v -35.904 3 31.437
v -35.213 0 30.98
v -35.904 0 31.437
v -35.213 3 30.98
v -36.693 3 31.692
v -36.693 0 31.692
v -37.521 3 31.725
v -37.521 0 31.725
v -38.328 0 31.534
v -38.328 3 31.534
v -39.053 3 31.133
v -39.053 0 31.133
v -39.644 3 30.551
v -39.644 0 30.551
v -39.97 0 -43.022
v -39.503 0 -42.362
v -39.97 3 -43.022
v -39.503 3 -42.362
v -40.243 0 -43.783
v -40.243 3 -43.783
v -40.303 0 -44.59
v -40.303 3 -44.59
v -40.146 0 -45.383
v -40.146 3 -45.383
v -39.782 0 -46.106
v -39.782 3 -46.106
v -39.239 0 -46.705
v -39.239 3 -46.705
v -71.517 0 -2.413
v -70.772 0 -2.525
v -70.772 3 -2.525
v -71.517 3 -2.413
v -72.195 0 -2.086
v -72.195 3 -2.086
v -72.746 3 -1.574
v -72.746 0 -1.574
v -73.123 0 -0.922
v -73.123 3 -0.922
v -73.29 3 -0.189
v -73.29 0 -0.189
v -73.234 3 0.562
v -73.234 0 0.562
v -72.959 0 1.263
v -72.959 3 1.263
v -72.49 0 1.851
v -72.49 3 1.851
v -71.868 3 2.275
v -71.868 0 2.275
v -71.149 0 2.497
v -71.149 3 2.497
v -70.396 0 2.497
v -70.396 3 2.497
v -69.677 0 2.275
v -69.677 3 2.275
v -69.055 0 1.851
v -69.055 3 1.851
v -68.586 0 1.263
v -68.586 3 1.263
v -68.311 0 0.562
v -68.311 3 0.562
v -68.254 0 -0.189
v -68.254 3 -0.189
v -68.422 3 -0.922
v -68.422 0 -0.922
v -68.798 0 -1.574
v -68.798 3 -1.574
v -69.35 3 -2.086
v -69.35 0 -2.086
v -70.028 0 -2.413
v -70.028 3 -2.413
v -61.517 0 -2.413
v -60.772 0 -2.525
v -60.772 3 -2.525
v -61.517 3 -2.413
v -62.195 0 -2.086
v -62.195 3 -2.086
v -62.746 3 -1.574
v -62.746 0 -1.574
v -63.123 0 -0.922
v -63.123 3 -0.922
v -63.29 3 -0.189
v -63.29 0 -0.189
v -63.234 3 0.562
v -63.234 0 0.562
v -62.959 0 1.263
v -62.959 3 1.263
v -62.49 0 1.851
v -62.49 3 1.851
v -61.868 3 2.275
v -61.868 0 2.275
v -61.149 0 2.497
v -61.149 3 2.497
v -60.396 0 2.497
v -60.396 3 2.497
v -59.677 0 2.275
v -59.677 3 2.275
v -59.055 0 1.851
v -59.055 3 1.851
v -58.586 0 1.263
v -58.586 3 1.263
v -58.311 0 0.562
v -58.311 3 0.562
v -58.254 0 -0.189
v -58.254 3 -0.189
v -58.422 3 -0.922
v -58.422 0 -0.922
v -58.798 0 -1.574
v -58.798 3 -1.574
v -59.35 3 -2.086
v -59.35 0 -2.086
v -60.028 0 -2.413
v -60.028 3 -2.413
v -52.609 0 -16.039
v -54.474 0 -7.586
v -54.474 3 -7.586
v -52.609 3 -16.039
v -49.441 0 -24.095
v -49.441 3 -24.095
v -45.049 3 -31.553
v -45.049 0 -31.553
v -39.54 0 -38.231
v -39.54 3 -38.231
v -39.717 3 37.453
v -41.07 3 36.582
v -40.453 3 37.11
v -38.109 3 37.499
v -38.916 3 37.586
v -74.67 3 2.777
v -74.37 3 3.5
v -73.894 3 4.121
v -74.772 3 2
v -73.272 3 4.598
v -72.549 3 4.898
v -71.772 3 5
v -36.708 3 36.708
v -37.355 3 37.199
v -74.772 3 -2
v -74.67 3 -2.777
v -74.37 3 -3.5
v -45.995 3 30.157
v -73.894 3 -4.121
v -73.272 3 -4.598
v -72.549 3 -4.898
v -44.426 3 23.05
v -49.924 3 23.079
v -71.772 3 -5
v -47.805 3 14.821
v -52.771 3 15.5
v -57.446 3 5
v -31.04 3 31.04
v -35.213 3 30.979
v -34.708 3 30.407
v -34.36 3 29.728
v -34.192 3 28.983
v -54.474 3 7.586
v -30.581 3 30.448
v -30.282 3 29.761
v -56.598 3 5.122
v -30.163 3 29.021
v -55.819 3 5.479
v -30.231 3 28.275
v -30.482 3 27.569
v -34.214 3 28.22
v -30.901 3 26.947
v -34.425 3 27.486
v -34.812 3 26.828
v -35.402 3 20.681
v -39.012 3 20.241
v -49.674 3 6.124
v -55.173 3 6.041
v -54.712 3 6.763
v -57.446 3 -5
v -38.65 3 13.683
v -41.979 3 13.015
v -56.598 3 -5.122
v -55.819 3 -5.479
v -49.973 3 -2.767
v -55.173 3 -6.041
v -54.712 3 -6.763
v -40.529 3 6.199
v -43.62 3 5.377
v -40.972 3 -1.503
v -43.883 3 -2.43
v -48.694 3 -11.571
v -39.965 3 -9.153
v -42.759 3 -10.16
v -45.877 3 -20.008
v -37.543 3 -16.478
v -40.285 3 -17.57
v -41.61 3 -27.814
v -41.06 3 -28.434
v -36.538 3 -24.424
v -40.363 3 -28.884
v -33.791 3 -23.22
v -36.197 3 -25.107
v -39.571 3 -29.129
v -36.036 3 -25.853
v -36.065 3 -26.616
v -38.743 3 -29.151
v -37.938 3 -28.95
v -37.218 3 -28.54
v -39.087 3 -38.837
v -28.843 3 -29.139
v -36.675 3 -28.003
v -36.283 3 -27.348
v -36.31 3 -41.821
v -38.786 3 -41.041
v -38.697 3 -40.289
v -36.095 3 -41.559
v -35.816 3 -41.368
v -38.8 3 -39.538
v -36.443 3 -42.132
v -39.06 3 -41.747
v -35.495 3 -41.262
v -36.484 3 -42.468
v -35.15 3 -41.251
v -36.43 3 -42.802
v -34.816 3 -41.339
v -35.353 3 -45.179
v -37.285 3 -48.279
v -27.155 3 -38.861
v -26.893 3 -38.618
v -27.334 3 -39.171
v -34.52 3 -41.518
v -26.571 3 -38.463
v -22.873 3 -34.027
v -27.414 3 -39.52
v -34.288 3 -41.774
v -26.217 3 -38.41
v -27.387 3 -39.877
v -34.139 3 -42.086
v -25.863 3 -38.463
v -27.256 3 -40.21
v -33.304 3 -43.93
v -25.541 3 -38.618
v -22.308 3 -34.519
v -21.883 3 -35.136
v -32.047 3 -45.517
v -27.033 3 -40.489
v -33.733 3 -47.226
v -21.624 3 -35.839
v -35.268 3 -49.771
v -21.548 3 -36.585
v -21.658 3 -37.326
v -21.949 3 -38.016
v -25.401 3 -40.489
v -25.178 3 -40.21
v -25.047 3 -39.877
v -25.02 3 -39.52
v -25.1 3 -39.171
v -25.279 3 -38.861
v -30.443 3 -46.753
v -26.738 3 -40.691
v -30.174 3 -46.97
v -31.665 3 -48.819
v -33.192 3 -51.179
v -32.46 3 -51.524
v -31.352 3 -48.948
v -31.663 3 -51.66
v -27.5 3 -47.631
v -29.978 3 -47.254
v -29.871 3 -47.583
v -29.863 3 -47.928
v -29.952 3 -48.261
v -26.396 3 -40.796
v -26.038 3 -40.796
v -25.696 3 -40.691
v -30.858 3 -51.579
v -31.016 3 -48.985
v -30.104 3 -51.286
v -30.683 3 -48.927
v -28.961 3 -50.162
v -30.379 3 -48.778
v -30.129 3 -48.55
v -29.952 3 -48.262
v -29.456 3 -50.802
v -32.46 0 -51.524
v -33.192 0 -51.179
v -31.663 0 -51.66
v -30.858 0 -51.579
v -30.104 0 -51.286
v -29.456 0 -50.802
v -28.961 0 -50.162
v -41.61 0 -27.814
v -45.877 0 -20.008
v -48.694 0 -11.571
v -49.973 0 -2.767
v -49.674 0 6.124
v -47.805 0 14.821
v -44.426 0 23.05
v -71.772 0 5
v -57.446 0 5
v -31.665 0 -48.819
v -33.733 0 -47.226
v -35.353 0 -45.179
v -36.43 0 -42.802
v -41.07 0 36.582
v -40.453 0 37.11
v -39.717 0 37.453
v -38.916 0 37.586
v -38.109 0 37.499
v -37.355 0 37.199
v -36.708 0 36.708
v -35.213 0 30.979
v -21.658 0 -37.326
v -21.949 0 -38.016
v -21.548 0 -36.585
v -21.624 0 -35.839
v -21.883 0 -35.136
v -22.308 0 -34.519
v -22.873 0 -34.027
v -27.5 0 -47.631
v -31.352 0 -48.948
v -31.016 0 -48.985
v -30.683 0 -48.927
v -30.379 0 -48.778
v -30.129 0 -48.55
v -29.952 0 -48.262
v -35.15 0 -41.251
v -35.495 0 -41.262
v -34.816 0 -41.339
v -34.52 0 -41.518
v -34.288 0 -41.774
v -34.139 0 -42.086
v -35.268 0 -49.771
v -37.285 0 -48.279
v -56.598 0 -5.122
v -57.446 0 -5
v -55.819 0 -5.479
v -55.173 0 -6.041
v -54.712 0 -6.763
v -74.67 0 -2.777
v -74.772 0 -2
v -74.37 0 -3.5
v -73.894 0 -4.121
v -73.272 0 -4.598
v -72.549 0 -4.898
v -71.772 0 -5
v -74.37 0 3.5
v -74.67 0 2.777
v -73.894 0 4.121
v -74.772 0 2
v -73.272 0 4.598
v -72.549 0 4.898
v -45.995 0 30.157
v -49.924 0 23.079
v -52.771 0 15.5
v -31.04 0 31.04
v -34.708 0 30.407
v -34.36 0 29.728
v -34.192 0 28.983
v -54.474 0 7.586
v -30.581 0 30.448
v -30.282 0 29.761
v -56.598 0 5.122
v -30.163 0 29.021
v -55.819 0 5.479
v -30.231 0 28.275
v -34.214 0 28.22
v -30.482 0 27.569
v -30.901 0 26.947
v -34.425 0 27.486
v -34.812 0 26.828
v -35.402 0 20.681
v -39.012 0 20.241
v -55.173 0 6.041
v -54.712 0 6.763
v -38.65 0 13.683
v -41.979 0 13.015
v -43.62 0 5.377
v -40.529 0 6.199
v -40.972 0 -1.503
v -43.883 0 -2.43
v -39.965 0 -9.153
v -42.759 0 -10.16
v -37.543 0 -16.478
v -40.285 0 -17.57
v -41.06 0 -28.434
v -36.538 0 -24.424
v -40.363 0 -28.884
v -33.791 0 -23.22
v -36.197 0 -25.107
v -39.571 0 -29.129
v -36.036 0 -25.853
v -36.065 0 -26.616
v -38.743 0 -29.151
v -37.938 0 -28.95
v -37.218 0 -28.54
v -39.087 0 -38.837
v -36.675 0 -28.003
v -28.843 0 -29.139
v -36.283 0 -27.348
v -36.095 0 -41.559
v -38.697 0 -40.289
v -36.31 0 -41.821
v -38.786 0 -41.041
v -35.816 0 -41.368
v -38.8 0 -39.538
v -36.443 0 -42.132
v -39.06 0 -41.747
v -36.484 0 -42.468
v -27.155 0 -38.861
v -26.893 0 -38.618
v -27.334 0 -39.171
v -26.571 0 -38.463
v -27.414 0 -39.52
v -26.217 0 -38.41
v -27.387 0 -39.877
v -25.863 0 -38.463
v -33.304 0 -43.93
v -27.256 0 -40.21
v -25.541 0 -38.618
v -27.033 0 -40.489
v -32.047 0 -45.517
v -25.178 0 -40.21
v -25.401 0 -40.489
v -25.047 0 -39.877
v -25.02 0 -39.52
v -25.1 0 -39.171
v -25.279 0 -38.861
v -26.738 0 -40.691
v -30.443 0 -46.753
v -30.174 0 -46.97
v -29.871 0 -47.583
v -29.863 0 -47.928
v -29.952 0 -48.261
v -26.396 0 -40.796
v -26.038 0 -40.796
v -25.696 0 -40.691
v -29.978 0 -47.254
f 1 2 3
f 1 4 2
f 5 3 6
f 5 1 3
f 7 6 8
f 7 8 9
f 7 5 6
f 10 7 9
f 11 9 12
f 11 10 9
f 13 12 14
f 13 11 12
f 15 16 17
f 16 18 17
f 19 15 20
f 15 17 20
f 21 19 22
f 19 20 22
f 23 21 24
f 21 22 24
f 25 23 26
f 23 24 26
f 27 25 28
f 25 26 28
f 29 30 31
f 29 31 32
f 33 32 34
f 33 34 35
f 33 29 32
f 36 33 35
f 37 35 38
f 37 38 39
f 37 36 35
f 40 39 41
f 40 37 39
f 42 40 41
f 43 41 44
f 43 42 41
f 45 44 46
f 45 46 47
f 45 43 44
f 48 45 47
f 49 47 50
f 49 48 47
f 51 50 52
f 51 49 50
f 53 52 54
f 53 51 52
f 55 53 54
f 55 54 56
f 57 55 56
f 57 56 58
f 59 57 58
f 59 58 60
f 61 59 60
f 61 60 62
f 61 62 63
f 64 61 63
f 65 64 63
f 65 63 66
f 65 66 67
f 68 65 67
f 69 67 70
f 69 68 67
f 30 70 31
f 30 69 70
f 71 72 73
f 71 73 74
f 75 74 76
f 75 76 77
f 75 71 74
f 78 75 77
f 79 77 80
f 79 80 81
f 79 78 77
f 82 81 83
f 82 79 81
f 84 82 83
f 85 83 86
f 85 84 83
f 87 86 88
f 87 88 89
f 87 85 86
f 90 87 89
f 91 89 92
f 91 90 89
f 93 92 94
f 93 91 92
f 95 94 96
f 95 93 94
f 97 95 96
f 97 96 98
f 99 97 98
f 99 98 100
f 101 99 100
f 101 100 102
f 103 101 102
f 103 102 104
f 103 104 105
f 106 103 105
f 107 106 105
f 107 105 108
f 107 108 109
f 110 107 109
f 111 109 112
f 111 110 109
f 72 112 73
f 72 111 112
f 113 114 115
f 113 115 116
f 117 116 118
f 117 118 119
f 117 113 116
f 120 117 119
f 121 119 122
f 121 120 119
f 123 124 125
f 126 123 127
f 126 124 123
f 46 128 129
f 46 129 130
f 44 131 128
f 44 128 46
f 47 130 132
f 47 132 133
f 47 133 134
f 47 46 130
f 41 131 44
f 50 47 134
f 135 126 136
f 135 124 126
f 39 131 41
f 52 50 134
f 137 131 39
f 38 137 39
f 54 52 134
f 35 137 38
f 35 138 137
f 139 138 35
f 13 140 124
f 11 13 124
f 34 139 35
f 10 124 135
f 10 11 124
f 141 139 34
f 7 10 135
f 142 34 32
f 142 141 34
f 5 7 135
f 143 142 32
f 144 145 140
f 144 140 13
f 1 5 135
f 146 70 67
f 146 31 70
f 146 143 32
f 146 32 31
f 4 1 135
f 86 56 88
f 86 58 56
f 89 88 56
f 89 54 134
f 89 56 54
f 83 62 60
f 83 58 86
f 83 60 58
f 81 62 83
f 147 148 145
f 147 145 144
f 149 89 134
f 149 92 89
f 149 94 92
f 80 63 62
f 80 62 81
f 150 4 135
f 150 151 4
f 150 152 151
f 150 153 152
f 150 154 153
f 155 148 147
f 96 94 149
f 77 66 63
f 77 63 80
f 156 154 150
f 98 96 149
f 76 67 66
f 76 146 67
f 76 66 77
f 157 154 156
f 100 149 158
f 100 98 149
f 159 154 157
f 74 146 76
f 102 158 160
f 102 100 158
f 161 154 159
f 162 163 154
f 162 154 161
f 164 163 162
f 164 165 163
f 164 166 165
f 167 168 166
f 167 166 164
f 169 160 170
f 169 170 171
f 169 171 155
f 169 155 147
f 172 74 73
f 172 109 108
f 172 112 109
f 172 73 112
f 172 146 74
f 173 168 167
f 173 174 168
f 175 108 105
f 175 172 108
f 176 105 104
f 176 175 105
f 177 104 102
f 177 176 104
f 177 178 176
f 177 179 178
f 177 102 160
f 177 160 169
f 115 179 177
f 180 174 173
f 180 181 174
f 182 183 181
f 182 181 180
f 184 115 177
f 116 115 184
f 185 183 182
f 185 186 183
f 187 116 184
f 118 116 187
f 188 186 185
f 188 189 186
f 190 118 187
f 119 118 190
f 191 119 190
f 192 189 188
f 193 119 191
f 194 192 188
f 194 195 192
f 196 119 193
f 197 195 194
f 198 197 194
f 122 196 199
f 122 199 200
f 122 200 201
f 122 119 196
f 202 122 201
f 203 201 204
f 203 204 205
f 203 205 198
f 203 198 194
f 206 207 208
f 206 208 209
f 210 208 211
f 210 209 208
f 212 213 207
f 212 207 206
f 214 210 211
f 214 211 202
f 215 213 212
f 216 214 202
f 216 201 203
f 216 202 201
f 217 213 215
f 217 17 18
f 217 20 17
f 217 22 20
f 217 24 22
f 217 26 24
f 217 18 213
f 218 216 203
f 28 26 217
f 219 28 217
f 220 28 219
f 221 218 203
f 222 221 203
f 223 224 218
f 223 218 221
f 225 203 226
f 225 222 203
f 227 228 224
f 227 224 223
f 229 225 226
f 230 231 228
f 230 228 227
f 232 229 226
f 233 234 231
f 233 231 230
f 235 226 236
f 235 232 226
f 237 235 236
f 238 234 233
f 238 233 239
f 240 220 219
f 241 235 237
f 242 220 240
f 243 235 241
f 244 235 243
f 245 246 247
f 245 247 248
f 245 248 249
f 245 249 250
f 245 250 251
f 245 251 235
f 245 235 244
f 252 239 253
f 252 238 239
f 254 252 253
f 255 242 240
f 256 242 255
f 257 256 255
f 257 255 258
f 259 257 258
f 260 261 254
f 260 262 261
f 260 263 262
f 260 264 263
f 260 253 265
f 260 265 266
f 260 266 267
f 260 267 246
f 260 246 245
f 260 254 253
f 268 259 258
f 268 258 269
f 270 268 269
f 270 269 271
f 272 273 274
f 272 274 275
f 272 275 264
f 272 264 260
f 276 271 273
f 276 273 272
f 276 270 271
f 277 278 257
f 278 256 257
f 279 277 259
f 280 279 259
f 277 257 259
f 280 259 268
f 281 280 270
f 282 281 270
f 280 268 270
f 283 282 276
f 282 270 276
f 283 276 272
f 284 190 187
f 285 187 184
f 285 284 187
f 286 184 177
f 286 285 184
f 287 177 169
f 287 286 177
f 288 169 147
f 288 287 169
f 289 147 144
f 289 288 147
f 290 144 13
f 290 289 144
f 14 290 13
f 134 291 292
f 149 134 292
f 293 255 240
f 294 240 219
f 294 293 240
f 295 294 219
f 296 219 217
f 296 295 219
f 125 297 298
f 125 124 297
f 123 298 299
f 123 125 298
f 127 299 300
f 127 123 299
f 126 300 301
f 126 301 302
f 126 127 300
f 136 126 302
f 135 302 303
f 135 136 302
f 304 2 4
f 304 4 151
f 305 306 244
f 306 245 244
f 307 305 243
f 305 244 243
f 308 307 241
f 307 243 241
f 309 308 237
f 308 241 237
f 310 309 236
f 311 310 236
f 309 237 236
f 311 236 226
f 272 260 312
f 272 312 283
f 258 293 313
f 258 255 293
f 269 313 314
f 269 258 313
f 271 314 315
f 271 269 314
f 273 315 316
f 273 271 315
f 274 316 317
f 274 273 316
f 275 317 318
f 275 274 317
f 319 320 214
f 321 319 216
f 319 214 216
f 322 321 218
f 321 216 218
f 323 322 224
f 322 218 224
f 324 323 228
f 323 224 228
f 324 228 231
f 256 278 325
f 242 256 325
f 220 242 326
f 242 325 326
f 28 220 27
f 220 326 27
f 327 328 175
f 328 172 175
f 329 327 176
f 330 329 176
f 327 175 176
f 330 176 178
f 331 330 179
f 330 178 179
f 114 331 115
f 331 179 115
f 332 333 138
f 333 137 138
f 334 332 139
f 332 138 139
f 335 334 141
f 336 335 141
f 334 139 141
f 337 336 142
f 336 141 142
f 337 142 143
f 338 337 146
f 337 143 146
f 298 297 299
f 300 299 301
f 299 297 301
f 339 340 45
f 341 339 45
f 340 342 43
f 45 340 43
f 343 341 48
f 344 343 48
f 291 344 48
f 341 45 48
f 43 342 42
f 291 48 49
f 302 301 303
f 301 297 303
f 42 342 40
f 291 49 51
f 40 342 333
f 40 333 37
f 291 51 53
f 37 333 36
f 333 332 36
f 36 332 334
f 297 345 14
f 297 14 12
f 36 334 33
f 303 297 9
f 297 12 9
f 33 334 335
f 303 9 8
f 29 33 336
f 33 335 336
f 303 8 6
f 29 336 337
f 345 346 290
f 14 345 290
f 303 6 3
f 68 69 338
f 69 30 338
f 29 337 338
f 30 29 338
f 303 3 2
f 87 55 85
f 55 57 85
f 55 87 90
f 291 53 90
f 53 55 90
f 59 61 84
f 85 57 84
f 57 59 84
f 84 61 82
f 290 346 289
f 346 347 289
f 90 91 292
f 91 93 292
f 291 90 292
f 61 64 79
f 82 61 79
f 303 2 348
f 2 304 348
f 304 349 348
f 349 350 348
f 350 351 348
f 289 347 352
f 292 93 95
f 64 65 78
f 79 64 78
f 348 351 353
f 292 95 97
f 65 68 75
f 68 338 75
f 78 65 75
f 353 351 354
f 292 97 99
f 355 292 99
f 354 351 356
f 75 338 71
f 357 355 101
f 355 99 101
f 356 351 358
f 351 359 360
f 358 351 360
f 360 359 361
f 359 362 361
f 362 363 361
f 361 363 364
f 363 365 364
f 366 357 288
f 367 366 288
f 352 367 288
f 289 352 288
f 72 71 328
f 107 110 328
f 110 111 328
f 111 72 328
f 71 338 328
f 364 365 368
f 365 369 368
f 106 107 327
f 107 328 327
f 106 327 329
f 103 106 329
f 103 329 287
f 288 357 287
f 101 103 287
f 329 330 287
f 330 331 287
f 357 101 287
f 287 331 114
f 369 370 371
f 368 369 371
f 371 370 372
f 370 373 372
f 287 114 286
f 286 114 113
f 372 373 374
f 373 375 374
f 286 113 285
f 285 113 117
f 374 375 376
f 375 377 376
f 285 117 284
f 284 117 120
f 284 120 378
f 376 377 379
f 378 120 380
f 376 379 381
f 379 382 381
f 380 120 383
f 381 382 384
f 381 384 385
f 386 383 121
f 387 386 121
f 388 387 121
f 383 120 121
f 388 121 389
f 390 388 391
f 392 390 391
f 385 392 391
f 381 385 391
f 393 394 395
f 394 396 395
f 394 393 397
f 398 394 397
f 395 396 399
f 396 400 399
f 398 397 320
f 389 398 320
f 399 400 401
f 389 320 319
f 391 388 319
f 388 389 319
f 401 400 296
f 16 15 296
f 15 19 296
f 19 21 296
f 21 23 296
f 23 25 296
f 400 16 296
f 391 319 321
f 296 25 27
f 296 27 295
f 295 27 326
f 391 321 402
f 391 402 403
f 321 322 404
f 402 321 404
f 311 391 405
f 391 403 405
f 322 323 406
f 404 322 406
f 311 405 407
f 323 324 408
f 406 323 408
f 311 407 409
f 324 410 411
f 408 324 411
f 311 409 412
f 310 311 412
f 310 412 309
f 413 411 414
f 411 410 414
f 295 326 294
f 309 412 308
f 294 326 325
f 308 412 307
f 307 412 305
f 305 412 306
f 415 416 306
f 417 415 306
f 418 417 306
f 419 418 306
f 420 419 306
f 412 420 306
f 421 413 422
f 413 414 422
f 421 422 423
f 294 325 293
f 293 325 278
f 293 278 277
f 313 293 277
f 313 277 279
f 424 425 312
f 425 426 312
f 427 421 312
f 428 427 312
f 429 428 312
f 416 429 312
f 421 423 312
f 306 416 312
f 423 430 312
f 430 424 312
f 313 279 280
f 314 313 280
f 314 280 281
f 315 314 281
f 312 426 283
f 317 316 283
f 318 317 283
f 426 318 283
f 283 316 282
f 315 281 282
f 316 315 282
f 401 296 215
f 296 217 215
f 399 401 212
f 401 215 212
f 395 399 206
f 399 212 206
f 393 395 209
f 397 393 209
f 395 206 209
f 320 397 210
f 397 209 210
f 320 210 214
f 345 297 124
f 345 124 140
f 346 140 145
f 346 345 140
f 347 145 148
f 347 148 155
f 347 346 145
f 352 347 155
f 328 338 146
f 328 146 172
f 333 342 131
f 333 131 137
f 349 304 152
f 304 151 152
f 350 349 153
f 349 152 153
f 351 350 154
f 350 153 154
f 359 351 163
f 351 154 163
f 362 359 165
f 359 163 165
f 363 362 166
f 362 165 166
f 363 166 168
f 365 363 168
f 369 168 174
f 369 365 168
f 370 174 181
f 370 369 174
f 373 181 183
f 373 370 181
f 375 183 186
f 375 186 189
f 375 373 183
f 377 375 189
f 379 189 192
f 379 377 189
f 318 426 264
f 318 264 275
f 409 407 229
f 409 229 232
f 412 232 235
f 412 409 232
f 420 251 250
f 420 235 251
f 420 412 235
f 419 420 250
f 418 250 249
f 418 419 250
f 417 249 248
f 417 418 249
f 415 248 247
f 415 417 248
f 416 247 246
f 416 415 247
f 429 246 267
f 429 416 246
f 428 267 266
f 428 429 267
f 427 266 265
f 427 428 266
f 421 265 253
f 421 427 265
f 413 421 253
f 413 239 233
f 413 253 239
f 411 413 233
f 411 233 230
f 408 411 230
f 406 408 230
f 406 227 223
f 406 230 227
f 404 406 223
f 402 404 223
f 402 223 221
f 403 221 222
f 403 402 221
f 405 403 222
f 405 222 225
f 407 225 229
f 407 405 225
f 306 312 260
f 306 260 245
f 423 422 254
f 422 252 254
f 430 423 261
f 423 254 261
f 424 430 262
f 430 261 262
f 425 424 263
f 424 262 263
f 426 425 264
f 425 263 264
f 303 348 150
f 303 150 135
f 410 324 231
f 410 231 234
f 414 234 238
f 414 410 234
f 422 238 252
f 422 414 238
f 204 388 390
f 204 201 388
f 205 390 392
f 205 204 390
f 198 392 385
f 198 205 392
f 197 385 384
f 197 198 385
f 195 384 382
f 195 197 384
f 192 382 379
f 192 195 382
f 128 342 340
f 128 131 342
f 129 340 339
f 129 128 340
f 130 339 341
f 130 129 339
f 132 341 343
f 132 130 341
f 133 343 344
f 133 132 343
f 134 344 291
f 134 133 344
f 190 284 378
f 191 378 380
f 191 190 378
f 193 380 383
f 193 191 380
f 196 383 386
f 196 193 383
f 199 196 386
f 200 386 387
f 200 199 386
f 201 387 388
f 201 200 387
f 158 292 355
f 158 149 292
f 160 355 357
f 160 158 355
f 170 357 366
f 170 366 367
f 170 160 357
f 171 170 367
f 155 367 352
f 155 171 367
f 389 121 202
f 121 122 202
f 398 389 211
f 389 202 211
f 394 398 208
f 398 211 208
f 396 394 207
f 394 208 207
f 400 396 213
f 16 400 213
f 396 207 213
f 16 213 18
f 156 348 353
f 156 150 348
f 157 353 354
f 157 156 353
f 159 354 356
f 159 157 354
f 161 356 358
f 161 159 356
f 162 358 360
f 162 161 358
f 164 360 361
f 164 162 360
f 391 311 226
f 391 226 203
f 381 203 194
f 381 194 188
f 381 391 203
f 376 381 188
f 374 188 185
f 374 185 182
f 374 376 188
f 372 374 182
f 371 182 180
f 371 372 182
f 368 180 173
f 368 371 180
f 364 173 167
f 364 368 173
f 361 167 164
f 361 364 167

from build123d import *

# Parameters (mm, degrees)
BOSS_EXTRUDE1_DEPTH          = 3
CUT_EXTRUDE_THIN1_DEPTH      = 73.819983521
CUT_EXTRUDE_THIN1_DEPTH_BACK = 3
FILLET1_R                    = 3.05
BOSS_EXTRUDE2_DEPTH          = 3
CUT_EXTRUDE1_DEPTH           = 77.32004979
CUT_EXTRUDE1_DEPTH_BACK      = 77.32004979
SKETCH4_R                    = 1.2
CUT_EXTRUDE_THIN2_DEPTH      = 77.32004979
CUT_EXTRUDE_THIN2_DEPTH_BACK = 3
FILLET2_R                    = 1.2
SKETCH6_W                    = 20
SKETCH6_H                    = 10
SKETCH6_R                    = 2.525
BOSS_EXTRUDE3_DEPTH          = 3
FILLET3_R                    = 3


with BuildPart() as part:
    # Sketch1 → Boss-Extrude1 (new body)
    with BuildSketch(Plane(origin=(0, 0, 0), x_dir=(1, 0, 0), z_dir=(0, 1, 0))):
        with BuildLine():
            Line((-27.5, 47.631397208), (-20.5, 35.507041555))
            ThreePointArc((-20.5, 35.507041555), (-40.649239316, 5.351573881), (-28.991378029, -28.991378029))
            Line((-28.991378029, -28.991378029), (-38.890872965, -38.890872965))
            ThreePointArc((-38.890872965, -38.890872965), (-54.529467376, 7.178940572), (-27.5, 47.631397208))
        make_face()
    extrude(amount=BOSS_EXTRUDE1_DEPTH)

    # Sketch2 → Cut-Extrude-Thin1 (cut, two sides: drawn at the far end of the back side and taken through both)
    with BuildSketch(Plane(origin=(0, 3, 0), x_dir=(1, 0, 0), z_dir=(0, 1, 0)).offset(-CUT_EXTRUDE_THIN1_DEPTH_BACK)):
        with BuildLine():
            ThreePointArc((-32.997630308, -29.03030992), (-43.925085447, -1.479651456), (-34.876429564, 26.743918204))
            Line((-34.876429564, 26.743918204), (-39.717071665, 30.455815838))
            ThreePointArc((-39.717071665, 30.455815838), (-50.021627455, -1.685018325), (-37.577506187, -33.0595452))
            Line((-37.577506187, -33.0595452), (-32.997630308, -29.03030992))
        make_face()
    extrude(amount=CUT_EXTRUDE_THIN1_DEPTH + CUT_EXTRUDE_THIN1_DEPTH_BACK, mode=Mode.SUBTRACT)

    # Fillet1
    fillet1_edges = [part.edges().sort_by_distance(p)[0] for p in [
        (-39.717071665, 1.5, -30.455815838),
        (-34.876429564, 1.5, -26.743918204),
        (-32.997630308, 1.5, 29.03030992),
        (-37.577506187, 1.5, 33.0595452),
    ]]
    fillet(fillet1_edges, radius=FILLET1_R - 0.0001)  # a hair under: the kernel refuses the full size

    # Sketch3 → Boss-Extrude2 (add)
    with BuildSketch(Plane(origin=(0, 0, 0), x_dir=(1, 0, 0), z_dir=(0, 1, 0))):
        with BuildLine():
            Line((-27.5, 47.631397208), (-30.5, 52.827549631))
            ThreePointArc((-30.5, 52.827549631), (-36.284189992, 49.035268498), (-41.601899964, 44.612575799))
            Line((-41.601899964, 44.612575799), (-37.509909803, 40.224453589))
            ThreePointArc((-37.509909803, 40.224453589), (-32.715253271, 44.212127334), (-27.5, 47.631397208))
        make_face()
    extrude(amount=BOSS_EXTRUDE2_DEPTH)

    # Sketch4 → Cut-Extrude1 (cut, two sides: drawn at the far end of the back side and taken through both)
    with BuildSketch(Plane(origin=(0, 3, 0), x_dir=(1, 0, 0), z_dir=(0, 1, 0)).offset(-CUT_EXTRUDE1_DEPTH_BACK)):
        with Locations(Location((-26.217006802, 39.609576548, 0), (0, 0, 270))):
            Circle(SKETCH4_R)
    extrude(amount=CUT_EXTRUDE1_DEPTH + CUT_EXTRUDE1_DEPTH_BACK, mode=Mode.SUBTRACT)

    # Sketch5 → Cut-Extrude-Thin2 (cut, two sides: drawn at the far end of the back side and taken through both)
    with BuildSketch(Plane(origin=(0, 3, 0), x_dir=(1, 0, 0), z_dir=(0, 1, 0)).offset(-CUT_EXTRUDE_THIN2_DEPTH_BACK)):
        with BuildLine():
            ThreePointArc((-30.458263972, 49.433106342), (-34.605510743, 46.252091255), (-36.751172642, 41.486102609))
            Line((-36.751172642, 41.486102609), (-34.388369089, 41.065199567))
            ThreePointArc((-34.388369089, 41.065199567), (-32.723977149, 44.762181415), (-29.506953953, 47.22969779))
            Line((-29.506953953, 47.22969779), (-30.458263972, 49.433106342))
        make_face()
    extrude(amount=CUT_EXTRUDE_THIN2_DEPTH + CUT_EXTRUDE_THIN2_DEPTH_BACK, mode=Mode.SUBTRACT)

    # Fillet2
    fillet2_edges = [part.edges().sort_by_distance(p)[0] for p in [
        (-34.388369089, 1.5, -41.065199567),
        (-36.751172642, 1.5, -41.486102609),
        (-30.458263972, 1.5, -49.433106342),
        (-29.506953953, 1.5, -47.22969779),
    ]]
    fillet(fillet2_edges, radius=FILLET2_R - 0.0001)  # a hair under: the kernel refuses the full size

    # Sketch6 → Boss-Extrude3 (add)
    with BuildSketch(Plane(origin=(0, 0, 0), x_dir=(1, 0, 0), z_dir=(0, 1, 0))):
        with Locations((-64.772255751, 0)):
            Rectangle(SKETCH6_W, SKETCH6_H)
        with Locations(Location((-70.772255751, 0, 0), (0, 0, 90))):
            Circle(SKETCH6_R, mode=Mode.SUBTRACT)
        with Locations(Location((-60.772255751, 0, 0), (0, 0, 90))):
            Circle(SKETCH6_R, mode=Mode.SUBTRACT)
    extrude(amount=BOSS_EXTRUDE3_DEPTH)

    # Fillet3
    fillet3_edges = [part.edges().sort_by_distance(p)[0] for p in [
        (-74.772255751, 1.5, 5),
        (-74.772255751, 1.5, -5),
        (-54.772255751, 1.5, 5),
        (-54.772255751, 1.5, -5),
        (-37.509909803, 1.5, -40.224453589),
        (-41.601899964, 1.5, -44.612575799),
        (-30.5, 1.5, -52.827549631),
        (-20.5, 1.5, -35.507041555),
        (-28.991378029, 1.5, 28.991378029),
        (-38.890872965, 1.5, 38.890872965),
    ]]
    fillet(fillet3_edges, radius=FILLET3_R - 0.0001)  # a hair under: the kernel refuses the full size


solid = part.part
